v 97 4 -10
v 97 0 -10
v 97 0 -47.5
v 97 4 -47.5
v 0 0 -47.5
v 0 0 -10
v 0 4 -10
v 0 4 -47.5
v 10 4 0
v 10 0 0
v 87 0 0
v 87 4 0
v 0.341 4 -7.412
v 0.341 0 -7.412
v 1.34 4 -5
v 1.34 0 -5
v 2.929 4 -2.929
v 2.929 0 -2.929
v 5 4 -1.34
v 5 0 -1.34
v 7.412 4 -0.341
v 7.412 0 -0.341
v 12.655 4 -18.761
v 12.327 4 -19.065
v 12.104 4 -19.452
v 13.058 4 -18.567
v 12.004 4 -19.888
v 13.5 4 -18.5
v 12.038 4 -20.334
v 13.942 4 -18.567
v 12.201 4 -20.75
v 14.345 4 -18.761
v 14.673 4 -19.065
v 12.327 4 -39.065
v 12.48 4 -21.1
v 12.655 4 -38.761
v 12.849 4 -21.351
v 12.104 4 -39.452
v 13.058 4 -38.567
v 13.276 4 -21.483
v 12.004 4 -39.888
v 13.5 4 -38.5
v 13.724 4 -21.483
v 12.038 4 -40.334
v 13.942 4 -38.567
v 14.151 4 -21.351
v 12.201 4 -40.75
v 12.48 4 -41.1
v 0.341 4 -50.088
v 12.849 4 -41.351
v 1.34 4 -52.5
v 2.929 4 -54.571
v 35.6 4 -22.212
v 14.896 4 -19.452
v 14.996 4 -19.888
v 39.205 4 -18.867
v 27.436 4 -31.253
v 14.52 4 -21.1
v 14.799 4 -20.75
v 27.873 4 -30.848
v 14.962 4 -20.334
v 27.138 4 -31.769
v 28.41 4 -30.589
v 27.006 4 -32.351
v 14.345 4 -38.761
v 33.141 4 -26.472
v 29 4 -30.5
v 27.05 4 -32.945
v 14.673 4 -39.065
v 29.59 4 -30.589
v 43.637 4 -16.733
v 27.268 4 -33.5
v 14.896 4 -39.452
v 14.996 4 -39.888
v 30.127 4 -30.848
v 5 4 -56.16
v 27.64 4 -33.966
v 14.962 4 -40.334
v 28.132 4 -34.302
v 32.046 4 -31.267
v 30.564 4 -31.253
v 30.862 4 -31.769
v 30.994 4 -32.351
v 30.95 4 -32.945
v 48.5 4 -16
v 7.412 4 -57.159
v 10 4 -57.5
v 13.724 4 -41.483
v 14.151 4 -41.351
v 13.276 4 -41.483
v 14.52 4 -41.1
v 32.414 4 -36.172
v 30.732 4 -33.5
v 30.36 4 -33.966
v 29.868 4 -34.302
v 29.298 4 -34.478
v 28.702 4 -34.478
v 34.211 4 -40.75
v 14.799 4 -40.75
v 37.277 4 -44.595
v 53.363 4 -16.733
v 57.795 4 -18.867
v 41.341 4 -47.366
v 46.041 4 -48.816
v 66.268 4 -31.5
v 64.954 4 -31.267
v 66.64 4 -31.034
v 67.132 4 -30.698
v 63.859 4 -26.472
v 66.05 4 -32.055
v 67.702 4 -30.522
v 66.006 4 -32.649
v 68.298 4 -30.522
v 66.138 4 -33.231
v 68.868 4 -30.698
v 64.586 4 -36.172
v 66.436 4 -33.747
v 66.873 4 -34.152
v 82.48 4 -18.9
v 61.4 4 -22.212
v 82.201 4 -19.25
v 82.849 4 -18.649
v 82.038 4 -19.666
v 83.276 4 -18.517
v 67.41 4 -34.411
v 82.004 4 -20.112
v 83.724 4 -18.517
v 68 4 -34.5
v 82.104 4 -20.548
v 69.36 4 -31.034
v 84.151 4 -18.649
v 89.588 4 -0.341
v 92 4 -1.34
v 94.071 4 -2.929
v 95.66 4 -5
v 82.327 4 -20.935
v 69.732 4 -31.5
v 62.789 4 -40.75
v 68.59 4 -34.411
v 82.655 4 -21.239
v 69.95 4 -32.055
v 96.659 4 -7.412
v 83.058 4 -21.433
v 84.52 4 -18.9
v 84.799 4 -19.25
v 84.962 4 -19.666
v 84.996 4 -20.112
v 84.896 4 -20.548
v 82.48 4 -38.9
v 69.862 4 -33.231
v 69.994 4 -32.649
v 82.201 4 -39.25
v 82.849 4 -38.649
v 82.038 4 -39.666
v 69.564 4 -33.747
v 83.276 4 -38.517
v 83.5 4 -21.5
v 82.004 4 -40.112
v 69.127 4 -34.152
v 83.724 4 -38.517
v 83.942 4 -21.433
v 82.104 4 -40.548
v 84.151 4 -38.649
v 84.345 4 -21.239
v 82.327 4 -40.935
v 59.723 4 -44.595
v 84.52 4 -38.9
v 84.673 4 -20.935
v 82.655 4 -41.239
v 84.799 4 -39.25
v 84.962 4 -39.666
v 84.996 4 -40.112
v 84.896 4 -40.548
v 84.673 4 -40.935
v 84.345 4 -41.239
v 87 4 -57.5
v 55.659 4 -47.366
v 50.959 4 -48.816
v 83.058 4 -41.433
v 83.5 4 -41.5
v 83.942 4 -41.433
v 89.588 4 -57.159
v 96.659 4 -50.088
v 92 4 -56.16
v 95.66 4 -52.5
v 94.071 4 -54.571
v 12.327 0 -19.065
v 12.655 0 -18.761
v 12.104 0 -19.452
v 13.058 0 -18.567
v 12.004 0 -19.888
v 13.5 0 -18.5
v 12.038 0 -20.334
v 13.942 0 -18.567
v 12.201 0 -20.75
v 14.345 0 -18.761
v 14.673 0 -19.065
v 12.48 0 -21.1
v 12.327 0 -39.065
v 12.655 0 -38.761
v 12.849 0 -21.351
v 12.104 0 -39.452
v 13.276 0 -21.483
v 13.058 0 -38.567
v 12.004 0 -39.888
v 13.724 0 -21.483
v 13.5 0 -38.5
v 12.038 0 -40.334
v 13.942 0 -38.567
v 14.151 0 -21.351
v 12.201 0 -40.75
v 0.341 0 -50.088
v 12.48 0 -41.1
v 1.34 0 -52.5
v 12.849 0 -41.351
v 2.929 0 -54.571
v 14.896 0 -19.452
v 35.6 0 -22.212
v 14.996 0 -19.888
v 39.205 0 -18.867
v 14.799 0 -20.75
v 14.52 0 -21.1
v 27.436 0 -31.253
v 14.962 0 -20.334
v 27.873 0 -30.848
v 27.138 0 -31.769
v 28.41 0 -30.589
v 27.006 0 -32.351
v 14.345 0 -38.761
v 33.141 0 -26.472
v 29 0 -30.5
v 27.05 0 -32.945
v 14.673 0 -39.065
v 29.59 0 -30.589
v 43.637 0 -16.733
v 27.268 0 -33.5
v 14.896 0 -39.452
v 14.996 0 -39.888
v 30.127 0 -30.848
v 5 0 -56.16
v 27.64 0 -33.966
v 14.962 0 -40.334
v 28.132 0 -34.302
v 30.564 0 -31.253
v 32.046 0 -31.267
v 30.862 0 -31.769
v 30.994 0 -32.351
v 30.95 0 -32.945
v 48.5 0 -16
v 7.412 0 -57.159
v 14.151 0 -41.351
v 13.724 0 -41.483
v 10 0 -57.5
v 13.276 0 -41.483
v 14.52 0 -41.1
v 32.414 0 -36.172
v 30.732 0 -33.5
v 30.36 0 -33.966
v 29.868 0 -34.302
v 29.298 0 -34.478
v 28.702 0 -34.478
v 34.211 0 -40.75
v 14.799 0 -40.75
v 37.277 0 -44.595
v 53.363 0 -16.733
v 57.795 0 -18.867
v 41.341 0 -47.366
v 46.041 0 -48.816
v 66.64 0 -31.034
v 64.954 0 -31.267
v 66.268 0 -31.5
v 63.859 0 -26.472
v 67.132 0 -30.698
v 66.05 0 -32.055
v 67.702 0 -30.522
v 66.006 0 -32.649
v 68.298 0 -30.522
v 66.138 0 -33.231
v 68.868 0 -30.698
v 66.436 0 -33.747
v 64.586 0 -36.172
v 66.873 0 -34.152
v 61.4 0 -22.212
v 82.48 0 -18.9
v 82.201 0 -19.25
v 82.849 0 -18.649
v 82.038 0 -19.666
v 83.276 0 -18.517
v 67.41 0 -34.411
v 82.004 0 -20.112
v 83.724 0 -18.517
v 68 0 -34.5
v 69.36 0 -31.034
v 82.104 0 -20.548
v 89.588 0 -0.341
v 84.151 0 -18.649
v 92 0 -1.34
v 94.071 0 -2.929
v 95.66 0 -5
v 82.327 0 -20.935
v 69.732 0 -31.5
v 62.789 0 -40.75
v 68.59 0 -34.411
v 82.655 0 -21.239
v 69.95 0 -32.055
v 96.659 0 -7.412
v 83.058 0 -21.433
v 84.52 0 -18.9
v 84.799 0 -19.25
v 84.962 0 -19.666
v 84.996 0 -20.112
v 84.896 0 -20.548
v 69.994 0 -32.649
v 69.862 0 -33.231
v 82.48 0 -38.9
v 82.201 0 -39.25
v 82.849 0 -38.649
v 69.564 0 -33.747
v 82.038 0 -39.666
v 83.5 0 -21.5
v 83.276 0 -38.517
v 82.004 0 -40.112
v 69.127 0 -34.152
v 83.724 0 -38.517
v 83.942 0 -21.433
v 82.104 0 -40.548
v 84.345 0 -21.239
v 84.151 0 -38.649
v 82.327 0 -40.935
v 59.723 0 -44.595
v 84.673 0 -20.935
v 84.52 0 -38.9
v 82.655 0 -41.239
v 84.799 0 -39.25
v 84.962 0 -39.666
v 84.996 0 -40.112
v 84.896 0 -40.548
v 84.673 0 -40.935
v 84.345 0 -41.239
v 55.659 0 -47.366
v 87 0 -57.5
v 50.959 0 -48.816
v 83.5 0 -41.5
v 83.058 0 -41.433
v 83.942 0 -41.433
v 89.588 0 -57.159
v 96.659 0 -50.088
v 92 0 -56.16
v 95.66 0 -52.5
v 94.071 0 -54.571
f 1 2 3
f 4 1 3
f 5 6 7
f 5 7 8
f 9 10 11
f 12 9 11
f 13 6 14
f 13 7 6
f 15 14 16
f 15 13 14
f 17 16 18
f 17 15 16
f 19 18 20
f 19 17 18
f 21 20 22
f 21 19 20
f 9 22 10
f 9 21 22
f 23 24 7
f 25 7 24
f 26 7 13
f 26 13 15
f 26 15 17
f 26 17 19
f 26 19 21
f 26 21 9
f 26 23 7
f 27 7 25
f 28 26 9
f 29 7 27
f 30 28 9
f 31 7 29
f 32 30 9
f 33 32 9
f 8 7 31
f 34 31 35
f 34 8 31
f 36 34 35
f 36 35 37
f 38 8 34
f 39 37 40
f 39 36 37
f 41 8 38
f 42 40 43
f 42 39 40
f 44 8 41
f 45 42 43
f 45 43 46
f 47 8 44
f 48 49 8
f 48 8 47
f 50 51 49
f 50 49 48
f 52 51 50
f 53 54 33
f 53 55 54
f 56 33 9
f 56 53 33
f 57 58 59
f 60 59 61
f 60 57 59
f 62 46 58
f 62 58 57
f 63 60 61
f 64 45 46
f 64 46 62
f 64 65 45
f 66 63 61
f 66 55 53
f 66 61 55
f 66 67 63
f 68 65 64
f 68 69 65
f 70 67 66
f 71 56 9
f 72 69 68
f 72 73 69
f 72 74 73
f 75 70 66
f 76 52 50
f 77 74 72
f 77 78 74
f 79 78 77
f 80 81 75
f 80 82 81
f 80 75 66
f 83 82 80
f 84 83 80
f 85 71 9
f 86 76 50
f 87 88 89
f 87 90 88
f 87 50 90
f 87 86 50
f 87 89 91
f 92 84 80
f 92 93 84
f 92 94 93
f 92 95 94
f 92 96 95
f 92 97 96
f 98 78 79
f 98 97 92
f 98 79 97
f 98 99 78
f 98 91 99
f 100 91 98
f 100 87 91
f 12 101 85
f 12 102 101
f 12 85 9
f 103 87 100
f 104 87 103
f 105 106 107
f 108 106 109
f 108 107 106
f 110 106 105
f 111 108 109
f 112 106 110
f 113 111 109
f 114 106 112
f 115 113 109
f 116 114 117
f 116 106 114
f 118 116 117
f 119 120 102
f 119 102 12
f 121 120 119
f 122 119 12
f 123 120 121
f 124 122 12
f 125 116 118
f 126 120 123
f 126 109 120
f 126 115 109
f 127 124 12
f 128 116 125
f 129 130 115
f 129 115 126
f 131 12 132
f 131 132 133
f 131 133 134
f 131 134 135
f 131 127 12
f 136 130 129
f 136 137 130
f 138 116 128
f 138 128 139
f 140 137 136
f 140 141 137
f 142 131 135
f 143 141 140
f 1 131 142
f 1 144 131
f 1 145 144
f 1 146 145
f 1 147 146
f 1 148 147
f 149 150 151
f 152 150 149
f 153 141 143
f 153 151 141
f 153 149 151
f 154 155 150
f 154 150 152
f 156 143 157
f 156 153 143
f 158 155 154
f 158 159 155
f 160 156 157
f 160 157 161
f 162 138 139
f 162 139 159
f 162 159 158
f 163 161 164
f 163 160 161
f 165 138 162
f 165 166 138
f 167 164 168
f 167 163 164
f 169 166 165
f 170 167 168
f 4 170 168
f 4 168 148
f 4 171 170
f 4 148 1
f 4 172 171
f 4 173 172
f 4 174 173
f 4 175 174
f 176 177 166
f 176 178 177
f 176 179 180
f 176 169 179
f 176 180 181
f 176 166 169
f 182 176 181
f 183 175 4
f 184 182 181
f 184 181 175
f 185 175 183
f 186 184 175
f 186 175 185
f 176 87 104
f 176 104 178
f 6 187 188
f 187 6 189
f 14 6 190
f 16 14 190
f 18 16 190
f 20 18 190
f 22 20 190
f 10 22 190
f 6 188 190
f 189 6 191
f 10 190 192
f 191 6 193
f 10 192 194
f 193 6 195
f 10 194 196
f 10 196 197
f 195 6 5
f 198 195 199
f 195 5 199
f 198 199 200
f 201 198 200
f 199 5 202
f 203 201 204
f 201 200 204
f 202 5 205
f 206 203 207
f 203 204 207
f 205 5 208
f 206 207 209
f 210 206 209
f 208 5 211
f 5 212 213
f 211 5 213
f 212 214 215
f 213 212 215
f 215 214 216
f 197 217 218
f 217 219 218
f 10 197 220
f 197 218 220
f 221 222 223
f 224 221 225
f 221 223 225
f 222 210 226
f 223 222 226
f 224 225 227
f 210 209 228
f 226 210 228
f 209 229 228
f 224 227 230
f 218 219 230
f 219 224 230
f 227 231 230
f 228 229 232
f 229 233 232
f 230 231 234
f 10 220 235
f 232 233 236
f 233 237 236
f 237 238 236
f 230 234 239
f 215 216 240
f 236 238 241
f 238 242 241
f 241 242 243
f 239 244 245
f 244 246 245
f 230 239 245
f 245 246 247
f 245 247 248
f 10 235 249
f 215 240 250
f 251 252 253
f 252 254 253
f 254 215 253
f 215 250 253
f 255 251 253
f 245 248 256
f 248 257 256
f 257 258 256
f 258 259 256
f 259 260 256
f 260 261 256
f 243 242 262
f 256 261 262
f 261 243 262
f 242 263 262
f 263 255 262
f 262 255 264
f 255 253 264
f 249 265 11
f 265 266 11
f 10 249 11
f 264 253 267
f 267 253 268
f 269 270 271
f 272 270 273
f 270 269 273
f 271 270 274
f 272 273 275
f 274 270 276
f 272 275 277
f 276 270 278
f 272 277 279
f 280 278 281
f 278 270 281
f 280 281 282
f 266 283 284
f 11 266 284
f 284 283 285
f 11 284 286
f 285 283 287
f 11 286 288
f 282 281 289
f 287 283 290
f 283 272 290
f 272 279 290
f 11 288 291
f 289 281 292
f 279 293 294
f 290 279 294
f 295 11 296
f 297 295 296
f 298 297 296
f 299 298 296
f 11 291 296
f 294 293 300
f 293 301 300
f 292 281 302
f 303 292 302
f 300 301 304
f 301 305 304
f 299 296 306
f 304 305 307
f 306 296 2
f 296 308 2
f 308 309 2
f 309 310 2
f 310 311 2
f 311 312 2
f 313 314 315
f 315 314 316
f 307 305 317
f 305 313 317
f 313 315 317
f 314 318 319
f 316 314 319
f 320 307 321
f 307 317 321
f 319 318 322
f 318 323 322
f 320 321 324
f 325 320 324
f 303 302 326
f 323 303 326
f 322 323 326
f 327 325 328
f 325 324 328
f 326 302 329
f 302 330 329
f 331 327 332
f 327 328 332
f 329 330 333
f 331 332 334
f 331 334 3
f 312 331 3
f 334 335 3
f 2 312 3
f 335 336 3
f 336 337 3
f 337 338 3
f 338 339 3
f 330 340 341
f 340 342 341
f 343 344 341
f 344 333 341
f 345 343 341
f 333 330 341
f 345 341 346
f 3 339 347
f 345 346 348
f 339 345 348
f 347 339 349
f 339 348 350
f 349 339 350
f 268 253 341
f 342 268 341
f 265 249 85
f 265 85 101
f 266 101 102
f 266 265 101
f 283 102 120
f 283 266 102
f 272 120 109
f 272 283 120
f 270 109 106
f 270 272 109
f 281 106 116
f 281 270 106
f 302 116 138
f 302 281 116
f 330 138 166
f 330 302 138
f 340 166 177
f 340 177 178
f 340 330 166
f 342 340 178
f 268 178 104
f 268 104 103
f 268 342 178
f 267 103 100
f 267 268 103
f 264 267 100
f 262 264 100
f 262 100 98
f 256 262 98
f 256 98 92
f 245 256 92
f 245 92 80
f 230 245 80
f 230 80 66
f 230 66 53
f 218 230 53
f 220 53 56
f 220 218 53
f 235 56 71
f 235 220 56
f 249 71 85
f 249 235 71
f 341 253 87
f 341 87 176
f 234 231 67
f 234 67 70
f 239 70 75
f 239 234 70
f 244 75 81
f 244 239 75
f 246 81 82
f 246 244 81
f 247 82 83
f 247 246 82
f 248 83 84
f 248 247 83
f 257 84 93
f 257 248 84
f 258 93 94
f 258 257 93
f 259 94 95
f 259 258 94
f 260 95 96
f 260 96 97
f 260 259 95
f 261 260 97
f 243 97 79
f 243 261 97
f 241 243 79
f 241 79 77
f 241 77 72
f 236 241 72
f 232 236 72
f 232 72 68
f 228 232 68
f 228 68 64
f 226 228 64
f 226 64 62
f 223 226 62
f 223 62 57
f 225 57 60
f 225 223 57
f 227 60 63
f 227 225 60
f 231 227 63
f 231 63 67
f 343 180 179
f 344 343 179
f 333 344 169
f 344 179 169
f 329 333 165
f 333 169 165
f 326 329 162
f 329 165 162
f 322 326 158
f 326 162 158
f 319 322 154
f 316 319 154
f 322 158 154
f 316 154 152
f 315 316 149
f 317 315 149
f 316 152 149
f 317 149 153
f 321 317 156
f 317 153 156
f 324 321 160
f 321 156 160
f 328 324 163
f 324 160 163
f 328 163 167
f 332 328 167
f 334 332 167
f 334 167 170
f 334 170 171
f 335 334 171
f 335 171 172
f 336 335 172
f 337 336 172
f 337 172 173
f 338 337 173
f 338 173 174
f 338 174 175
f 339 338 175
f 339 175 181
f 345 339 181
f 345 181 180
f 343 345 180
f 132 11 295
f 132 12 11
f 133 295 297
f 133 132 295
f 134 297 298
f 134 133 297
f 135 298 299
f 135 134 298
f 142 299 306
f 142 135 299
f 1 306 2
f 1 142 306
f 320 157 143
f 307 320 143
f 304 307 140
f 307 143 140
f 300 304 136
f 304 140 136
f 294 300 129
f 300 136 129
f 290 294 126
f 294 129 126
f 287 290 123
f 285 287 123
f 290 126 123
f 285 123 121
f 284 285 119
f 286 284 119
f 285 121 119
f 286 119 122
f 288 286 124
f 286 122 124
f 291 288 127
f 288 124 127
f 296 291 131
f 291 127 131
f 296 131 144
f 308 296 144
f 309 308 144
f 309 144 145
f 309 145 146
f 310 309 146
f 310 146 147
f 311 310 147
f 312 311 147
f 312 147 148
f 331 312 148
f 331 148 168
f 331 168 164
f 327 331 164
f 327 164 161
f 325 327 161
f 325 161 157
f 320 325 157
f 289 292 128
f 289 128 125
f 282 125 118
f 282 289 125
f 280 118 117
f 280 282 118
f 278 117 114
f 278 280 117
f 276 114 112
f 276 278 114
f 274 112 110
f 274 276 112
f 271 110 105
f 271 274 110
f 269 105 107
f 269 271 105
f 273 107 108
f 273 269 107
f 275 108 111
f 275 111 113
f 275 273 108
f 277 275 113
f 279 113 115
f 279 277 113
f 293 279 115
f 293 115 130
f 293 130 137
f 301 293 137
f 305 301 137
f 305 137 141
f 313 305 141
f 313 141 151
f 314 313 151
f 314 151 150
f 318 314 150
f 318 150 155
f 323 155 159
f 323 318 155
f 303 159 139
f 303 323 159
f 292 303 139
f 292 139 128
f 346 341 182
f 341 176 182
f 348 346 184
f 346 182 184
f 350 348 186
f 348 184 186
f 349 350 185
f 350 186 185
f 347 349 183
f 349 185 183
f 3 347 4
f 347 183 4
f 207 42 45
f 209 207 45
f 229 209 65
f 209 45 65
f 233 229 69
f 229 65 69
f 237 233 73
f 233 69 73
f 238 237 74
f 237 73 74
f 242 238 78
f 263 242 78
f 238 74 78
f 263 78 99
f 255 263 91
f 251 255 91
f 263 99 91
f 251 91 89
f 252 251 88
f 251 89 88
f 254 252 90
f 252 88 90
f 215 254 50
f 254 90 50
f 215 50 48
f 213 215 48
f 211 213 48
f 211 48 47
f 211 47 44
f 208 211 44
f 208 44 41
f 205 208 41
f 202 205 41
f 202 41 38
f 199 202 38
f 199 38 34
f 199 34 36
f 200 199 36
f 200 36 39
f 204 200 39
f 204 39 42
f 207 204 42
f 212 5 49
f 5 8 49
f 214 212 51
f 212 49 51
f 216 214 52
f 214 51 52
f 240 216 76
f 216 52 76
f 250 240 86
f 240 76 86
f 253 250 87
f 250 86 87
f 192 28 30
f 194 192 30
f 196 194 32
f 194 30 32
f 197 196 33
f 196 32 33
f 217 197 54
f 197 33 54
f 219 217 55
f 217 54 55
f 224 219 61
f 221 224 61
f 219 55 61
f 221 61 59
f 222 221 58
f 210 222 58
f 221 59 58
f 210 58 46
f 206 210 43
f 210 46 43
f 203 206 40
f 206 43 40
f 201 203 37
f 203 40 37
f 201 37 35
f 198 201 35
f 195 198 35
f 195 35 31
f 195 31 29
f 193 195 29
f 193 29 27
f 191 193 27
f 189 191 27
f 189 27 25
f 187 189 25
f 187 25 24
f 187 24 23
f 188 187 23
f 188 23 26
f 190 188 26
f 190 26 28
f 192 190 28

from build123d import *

# Parameters (mm, degrees)
SKETCH_1_W          = 97
SKETCH_1_H          = 57.5
SKETCH_1_R          = 16.5
SKETCH_1_R_2        = 2
EXTRUDE_1_DEPTH     = 4
FILLET_1_R          = 10
SKETCH_2_R          = 1.5
CUT_EXTRUDE_1_DEPTH = 10


with BuildPart() as part:
    # Эскиз1 → Бобышка-Вытянуть1 (new body)
    with BuildSketch(Plane(origin=(0, 0, 0), x_dir=(1, 0, 0), z_dir=(0, 1, 0))):
        with Locations((48.5, 28.75)):
            Rectangle(SKETCH_1_W, SKETCH_1_H)
        with Locations(Location((48.5, 32.5, 0), (0, 0, 270))):
            Circle(SKETCH_1_R, mode=Mode.SUBTRACT)
        with Locations(Location((29, 32.5, 0), (0, 0, 270))):
            Circle(SKETCH_1_R_2, mode=Mode.SUBTRACT)
        with Locations(Location((68, 32.5, 0), (0, 0, 90))):
            Circle(SKETCH_1_R_2, mode=Mode.SUBTRACT)
    extrude(amount=EXTRUDE_1_DEPTH)

    # Скругление1
    fillet_1_edges = [part.edges().sort_by_distance(p)[0] for p in [
        (0, 2, -57.5),
        (97, 2, -57.5),
        (97, 2, 0),
        (0, 2, 0),
    ]]
    fillet(fillet_1_edges, radius=FILLET_1_R)

    # Эскиз2 → Вырез-Вытянуть1 (cut)
    with BuildSketch(Plane(origin=(0, 4, 0), x_dir=(1, 0, 0), z_dir=(0, 1, 0))):
        with Locations(Location((13.5, 20, 0), (0, 0, 270))):
            Circle(SKETCH_2_R)
        with Locations(Location((13.5, 40, 0), (0, 0, 270))):
            Circle(SKETCH_2_R)
        with Locations(Location((83.5, 40, 0), (0, 0, 90))):
            Circle(SKETCH_2_R)
        with Locations(Location((83.5, 20, 0), (0, 0, 90))):
            Circle(SKETCH_2_R)
    extrude(amount=-CUT_EXTRUDE_1_DEPTH, mode=Mode.SUBTRACT)


solid = part.part
